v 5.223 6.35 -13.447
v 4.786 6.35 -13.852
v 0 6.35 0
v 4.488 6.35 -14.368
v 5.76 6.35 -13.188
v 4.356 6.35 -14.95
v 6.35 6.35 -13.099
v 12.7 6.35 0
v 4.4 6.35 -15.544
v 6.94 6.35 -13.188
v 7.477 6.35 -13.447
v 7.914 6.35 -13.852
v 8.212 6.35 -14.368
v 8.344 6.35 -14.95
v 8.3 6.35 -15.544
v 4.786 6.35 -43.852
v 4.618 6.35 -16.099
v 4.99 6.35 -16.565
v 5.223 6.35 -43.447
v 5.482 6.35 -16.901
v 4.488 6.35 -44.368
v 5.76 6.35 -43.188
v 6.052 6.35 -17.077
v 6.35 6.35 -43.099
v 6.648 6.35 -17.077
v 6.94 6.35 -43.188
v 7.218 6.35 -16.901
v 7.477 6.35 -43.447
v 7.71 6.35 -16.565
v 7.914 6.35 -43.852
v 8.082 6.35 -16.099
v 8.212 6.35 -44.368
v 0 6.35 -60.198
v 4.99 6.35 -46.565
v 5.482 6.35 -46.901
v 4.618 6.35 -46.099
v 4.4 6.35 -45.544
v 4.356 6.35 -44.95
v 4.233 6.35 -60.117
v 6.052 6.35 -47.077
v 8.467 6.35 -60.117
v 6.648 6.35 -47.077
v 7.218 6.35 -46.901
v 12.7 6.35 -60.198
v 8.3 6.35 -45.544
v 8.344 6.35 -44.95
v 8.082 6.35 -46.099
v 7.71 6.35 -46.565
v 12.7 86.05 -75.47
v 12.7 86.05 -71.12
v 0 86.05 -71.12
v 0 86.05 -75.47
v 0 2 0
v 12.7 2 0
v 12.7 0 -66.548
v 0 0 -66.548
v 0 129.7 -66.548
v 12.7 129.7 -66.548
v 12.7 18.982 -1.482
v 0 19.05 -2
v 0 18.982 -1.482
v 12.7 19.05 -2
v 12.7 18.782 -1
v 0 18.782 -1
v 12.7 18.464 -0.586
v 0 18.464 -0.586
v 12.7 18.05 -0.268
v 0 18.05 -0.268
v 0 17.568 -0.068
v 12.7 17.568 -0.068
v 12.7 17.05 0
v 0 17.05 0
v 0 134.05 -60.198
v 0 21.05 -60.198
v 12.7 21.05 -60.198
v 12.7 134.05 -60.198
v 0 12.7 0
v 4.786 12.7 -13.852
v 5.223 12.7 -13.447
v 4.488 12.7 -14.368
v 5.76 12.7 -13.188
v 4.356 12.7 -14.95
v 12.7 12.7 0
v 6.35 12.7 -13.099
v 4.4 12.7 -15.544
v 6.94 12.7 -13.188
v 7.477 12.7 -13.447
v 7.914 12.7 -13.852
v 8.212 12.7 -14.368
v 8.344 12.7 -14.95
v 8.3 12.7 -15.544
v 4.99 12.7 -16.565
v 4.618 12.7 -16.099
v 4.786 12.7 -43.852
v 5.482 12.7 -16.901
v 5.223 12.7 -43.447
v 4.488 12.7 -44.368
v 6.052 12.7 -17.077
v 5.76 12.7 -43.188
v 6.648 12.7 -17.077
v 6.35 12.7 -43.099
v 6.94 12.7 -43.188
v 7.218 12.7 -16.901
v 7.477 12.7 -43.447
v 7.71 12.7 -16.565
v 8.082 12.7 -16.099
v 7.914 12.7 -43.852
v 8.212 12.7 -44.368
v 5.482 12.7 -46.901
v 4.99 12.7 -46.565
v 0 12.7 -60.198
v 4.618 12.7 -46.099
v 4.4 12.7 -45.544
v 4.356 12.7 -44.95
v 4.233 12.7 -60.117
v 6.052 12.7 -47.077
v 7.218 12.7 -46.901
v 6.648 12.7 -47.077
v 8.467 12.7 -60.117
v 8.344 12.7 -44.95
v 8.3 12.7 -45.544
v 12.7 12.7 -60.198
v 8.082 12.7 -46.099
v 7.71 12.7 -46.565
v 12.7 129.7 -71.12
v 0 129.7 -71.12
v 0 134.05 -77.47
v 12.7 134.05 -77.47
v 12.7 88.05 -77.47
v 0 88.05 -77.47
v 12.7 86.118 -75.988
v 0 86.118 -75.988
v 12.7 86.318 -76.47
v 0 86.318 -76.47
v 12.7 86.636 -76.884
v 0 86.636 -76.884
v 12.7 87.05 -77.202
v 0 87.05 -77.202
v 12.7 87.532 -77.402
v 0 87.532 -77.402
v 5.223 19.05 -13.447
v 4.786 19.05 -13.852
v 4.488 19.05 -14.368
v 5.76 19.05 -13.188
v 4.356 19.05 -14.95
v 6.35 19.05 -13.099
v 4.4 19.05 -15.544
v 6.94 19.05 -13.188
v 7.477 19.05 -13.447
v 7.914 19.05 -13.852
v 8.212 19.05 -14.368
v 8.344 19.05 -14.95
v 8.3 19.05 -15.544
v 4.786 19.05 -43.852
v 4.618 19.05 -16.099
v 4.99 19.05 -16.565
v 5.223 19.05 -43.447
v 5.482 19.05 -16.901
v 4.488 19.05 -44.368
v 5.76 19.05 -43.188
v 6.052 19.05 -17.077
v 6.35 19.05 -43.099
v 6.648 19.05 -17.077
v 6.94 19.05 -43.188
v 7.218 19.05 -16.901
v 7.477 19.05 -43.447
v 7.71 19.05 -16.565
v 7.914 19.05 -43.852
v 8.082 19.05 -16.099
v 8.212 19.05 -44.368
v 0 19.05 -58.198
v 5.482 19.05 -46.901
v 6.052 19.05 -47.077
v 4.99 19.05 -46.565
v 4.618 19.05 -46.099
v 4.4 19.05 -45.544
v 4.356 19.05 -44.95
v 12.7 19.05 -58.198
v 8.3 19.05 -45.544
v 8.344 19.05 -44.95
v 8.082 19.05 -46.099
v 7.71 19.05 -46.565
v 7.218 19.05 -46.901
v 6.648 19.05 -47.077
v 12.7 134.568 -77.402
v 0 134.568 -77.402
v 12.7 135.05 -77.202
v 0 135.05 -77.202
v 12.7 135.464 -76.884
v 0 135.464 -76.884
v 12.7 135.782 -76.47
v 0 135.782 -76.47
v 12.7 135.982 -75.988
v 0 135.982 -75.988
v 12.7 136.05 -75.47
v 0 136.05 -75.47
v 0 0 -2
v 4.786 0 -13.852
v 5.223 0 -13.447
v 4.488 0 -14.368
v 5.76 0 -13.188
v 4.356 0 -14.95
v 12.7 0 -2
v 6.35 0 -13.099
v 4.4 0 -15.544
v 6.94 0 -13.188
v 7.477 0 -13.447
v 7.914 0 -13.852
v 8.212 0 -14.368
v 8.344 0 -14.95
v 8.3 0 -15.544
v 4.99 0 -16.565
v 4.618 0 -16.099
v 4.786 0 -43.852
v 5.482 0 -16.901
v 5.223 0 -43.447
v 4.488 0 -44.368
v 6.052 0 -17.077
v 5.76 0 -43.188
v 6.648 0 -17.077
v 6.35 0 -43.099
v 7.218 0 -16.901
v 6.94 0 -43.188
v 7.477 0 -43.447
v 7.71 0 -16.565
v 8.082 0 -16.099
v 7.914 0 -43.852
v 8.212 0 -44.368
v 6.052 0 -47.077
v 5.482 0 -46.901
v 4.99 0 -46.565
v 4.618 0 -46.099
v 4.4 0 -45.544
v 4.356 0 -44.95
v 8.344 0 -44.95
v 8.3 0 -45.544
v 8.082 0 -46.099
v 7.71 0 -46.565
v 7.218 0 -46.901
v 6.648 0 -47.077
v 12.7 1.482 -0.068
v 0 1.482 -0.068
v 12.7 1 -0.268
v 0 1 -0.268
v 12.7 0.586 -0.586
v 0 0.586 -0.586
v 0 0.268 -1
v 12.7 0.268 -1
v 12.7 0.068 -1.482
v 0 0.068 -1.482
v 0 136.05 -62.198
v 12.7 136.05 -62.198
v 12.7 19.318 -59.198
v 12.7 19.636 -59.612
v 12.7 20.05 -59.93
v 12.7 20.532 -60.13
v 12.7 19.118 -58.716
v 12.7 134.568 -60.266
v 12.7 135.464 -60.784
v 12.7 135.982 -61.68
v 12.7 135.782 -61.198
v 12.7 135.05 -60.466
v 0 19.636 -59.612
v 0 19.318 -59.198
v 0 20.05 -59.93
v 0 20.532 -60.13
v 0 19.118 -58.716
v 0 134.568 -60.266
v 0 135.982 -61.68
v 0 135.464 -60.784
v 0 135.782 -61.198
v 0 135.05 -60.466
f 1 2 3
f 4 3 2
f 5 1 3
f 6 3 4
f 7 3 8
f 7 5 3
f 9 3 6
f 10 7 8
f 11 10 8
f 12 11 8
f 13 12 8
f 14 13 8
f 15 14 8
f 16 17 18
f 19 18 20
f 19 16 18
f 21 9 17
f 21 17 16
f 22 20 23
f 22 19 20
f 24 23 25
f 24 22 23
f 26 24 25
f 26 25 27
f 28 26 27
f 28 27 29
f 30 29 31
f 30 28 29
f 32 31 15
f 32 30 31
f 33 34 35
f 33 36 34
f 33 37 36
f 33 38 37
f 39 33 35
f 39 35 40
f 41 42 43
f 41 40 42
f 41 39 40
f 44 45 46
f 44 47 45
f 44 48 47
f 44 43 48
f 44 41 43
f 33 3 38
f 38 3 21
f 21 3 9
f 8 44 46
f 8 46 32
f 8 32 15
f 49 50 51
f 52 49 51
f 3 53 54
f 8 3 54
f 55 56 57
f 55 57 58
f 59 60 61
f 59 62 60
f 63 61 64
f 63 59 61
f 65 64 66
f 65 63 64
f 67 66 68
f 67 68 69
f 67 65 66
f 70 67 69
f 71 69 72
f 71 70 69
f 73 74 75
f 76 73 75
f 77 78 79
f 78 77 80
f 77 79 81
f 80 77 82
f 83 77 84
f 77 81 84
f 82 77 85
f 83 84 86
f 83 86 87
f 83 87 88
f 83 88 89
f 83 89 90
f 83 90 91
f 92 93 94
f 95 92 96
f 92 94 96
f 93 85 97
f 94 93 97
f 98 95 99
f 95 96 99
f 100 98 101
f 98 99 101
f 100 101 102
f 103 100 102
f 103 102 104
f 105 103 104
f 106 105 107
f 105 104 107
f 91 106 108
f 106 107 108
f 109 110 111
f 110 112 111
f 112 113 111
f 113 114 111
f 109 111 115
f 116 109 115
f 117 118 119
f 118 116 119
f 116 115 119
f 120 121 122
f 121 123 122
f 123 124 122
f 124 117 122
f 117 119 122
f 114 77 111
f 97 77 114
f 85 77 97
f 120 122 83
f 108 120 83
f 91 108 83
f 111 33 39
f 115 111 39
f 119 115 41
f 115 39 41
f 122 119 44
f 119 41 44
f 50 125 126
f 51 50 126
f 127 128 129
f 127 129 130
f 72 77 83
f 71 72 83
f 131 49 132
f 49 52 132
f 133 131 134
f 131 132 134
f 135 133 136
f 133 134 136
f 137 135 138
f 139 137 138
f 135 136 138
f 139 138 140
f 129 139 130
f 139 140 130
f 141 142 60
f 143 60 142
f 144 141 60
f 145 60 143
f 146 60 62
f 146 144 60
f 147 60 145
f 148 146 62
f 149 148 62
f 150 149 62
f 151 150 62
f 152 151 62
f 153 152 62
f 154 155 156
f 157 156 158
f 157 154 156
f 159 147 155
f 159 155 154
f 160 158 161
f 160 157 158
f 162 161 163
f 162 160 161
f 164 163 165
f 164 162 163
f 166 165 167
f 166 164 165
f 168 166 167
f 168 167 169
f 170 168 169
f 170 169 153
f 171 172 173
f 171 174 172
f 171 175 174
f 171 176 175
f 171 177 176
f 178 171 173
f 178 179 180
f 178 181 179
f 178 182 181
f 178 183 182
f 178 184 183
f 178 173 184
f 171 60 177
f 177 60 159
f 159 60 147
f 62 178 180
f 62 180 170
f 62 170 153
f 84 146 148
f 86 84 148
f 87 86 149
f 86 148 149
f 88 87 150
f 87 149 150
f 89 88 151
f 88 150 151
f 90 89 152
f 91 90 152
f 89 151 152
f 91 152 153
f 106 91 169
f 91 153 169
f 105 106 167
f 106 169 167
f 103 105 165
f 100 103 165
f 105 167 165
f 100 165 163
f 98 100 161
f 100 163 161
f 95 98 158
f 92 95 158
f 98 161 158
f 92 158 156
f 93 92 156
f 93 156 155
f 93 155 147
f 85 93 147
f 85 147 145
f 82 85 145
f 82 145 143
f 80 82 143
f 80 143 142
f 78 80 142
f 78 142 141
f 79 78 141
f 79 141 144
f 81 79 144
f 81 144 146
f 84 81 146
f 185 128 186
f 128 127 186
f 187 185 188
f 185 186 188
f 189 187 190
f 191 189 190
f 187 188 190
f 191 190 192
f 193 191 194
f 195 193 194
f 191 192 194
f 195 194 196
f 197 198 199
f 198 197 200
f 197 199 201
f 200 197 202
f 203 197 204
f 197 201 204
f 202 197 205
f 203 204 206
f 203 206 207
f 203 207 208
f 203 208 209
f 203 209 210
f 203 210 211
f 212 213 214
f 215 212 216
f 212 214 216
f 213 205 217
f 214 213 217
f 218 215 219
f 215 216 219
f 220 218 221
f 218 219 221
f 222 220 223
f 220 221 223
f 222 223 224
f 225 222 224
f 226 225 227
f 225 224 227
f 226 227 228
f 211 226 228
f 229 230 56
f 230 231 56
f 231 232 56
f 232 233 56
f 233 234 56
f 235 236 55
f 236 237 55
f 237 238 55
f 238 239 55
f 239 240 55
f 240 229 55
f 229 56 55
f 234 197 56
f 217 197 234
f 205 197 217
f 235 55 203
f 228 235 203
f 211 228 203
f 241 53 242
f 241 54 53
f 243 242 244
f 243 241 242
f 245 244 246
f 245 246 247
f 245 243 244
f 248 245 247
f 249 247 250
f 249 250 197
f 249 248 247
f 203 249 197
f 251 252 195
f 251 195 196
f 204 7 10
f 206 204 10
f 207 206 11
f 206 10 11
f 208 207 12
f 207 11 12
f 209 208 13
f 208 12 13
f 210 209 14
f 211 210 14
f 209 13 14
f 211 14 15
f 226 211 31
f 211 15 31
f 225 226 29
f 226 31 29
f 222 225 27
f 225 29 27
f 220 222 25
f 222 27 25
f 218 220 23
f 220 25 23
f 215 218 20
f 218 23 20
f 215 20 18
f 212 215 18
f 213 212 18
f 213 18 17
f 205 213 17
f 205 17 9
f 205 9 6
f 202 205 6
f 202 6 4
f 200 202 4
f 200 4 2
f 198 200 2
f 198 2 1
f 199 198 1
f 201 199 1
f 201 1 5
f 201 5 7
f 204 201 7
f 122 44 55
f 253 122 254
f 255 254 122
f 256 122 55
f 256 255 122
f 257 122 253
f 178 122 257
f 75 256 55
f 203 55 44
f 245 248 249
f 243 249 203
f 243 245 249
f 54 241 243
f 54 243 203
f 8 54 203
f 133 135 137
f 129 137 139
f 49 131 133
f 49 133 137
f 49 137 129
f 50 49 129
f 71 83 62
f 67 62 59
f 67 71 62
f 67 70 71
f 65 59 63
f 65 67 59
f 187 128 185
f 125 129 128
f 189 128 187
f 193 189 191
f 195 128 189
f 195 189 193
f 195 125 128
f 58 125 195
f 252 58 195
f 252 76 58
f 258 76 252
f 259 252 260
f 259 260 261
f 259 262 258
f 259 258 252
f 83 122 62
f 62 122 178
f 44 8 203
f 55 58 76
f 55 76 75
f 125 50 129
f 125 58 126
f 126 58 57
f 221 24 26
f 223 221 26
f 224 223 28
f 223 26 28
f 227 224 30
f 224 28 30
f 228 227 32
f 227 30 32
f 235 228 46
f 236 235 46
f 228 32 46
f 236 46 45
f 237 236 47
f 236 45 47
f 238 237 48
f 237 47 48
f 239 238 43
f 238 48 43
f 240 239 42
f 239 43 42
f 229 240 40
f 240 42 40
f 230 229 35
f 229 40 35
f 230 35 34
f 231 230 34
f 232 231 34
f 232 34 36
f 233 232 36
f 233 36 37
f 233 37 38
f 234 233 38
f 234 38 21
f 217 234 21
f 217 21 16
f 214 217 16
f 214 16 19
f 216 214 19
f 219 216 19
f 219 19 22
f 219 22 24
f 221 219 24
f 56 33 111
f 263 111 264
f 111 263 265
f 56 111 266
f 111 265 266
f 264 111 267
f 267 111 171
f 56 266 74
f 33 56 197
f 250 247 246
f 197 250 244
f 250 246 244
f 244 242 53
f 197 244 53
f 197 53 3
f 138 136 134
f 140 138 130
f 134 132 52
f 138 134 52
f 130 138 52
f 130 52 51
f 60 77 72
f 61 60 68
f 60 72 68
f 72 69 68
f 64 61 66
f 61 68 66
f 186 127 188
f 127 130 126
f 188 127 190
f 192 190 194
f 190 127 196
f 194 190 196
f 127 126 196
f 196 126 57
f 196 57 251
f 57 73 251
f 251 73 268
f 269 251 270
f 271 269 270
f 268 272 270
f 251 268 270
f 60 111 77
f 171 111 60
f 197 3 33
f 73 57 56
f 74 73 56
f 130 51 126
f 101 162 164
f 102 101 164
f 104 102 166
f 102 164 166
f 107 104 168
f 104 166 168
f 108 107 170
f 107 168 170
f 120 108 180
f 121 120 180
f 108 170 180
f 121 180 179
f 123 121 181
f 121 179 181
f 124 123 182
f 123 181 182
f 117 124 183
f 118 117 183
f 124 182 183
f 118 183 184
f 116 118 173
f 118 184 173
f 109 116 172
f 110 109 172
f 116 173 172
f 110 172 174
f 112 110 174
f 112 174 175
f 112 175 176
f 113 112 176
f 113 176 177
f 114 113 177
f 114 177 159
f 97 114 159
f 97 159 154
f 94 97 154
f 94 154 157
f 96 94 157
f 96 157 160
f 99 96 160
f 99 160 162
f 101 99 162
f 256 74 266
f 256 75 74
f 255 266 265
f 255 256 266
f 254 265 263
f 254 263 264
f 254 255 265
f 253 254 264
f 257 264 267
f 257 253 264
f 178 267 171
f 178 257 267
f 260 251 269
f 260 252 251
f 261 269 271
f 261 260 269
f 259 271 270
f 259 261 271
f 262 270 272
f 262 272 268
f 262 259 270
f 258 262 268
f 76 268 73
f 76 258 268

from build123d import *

# Parameters (mm, degrees)
SKETCH1_W           = 12.7
SKETCH1_H           = 66.548
BOSS_EXTRUDE1_DEPTH = 6.35
SKETCH2_W           = 12.7
SKETCH2_H           = 6.35
BOSS_EXTRUDE2_DEPTH = 6.35
SKETCH3_W           = 12.7
SKETCH3_H           = 66.548
BOSS_EXTRUDE3_DEPTH = 6.35
SKETCH4_W           = 12.7
SKETCH4_H           = 6.35
BOSS_EXTRUDE4_DEPTH = 117
SKETCH5_W           = 12.7
SKETCH5_H           = 6.35
BOSS_EXTRUDE5_DEPTH = 4.572
SKETCH6_W           = 12.7
SKETCH6_H           = 50
BOSS_EXTRUDE6_DEPTH = 6.35
BOSS_EXTRUDE7_DEPTH = 6.35
SKETCH9_R           = 2
CUT_EXTRUDE1_DEPTH  = 141.896738429
FILLET1_R           = 2
FILLET2_R           = 2


with BuildPart() as part:
    # Sketch1 → Boss-Extrude1 (new body)
    with BuildSketch(Plane(origin=(0, 0, 0), x_dir=(1, 0, 0), z_dir=(0, 1, 0))):
        with Locations((6.35, 33.274)):
            Rectangle(SKETCH1_W, SKETCH1_H)
    extrude(amount=BOSS_EXTRUDE1_DEPTH)

    # Sketch2 → Boss-Extrude2 (add)
    with BuildSketch(Plane(origin=(0, 6.35, 0), x_dir=(1, 0, 0), z_dir=(0, 1, 0))):
        with Locations((6.35, 63.373)):
            Rectangle(SKETCH2_W, SKETCH2_H)
    extrude(amount=BOSS_EXTRUDE2_DEPTH)

    # Sketch3 → Boss-Extrude3 (add)
    with BuildSketch(Plane(origin=(0, 12.7, 0), x_dir=(1, 0, 0), z_dir=(0, 1, 0))):
        with Locations((6.35, 33.274)):
            Rectangle(SKETCH3_W, SKETCH3_H)
    extrude(amount=BOSS_EXTRUDE3_DEPTH)

    # Sketch4 → Boss-Extrude4 (add)
    with BuildSketch(Plane(origin=(0, 19.05, 0), x_dir=(1, 0, 0), z_dir=(0, 1, 0))):
        with Locations((6.35, 63.373)):
            Rectangle(SKETCH4_W, SKETCH4_H)
    extrude(amount=BOSS_EXTRUDE4_DEPTH)

    # Sketch5 → Boss-Extrude5 (add)
    with BuildSketch(Plane(origin=(0, 0, -66.548), x_dir=(-1, 0, 0), z_dir=(0, 0, -1))):
        with Locations((-6.35, 132.875)):
            Rectangle(SKETCH5_W, SKETCH5_H)
    extrude(amount=BOSS_EXTRUDE5_DEPTH)

    # Sketch6 → Boss-Extrude6 (add)
    with BuildSketch(Plane(origin=(0, 0, -71.12), x_dir=(-1, 0, 0), z_dir=(0, 0, -1))):
        with Locations((-6.35, 111.05)):
            Rectangle(SKETCH6_W, SKETCH6_H)
    extrude(amount=BOSS_EXTRUDE6_DEPTH)

    # Sketch7 → Boss-Extrude7 (add)
    with BuildSketch(Plane(origin=(0, 6.35, 0), x_dir=(1, 0, 0), z_dir=(0, 1, 0))):
        with BuildLine():
            Line((12.7, 60.198), (0, 60.198))
            ThreePointArc((0, 60.198), (6.35, 60.107267194), (12.7, 60.198))
        make_face()
    extrude(amount=BOSS_EXTRUDE7_DEPTH)

    # Sketch9 → Cut-Extrude1 (cut, through all)
    with BuildSketch(Plane(origin=(0, 19.05, 0), x_dir=(1, 0, 0), z_dir=(0, 1, 0))):
        with Locations(Location((6.35, 45.099, 0), (0, 0, 270))):
            Circle(SKETCH9_R)
        with Locations(Location((6.35, 15.099, 0), (0, 0, 270))):
            Circle(SKETCH9_R)
    extrude(amount=-CUT_EXTRUDE1_DEPTH, mode=Mode.SUBTRACT)

    # Fillet1
    fillet1_edges = [part.edges().sort_by_distance(p)[0] for p in [
        (6.35, 19.05, 0),
        (6.35, 136.05, -60.198),
        (6.35, 0, 0),
        (6.35, 86.05, -77.47),
        (6.35, 136.05, -77.47),
    ]]
    fillet(fillet1_edges, radius=FILLET1_R)

    # Fillet2
    fillet2_edges = [part.edges().sort_by_distance(p)[0] for p in [
        (6.35, 19.05, -60.198),
    ]]
    fillet(fillet2_edges, radius=FILLET2_R)


solid = part.part
